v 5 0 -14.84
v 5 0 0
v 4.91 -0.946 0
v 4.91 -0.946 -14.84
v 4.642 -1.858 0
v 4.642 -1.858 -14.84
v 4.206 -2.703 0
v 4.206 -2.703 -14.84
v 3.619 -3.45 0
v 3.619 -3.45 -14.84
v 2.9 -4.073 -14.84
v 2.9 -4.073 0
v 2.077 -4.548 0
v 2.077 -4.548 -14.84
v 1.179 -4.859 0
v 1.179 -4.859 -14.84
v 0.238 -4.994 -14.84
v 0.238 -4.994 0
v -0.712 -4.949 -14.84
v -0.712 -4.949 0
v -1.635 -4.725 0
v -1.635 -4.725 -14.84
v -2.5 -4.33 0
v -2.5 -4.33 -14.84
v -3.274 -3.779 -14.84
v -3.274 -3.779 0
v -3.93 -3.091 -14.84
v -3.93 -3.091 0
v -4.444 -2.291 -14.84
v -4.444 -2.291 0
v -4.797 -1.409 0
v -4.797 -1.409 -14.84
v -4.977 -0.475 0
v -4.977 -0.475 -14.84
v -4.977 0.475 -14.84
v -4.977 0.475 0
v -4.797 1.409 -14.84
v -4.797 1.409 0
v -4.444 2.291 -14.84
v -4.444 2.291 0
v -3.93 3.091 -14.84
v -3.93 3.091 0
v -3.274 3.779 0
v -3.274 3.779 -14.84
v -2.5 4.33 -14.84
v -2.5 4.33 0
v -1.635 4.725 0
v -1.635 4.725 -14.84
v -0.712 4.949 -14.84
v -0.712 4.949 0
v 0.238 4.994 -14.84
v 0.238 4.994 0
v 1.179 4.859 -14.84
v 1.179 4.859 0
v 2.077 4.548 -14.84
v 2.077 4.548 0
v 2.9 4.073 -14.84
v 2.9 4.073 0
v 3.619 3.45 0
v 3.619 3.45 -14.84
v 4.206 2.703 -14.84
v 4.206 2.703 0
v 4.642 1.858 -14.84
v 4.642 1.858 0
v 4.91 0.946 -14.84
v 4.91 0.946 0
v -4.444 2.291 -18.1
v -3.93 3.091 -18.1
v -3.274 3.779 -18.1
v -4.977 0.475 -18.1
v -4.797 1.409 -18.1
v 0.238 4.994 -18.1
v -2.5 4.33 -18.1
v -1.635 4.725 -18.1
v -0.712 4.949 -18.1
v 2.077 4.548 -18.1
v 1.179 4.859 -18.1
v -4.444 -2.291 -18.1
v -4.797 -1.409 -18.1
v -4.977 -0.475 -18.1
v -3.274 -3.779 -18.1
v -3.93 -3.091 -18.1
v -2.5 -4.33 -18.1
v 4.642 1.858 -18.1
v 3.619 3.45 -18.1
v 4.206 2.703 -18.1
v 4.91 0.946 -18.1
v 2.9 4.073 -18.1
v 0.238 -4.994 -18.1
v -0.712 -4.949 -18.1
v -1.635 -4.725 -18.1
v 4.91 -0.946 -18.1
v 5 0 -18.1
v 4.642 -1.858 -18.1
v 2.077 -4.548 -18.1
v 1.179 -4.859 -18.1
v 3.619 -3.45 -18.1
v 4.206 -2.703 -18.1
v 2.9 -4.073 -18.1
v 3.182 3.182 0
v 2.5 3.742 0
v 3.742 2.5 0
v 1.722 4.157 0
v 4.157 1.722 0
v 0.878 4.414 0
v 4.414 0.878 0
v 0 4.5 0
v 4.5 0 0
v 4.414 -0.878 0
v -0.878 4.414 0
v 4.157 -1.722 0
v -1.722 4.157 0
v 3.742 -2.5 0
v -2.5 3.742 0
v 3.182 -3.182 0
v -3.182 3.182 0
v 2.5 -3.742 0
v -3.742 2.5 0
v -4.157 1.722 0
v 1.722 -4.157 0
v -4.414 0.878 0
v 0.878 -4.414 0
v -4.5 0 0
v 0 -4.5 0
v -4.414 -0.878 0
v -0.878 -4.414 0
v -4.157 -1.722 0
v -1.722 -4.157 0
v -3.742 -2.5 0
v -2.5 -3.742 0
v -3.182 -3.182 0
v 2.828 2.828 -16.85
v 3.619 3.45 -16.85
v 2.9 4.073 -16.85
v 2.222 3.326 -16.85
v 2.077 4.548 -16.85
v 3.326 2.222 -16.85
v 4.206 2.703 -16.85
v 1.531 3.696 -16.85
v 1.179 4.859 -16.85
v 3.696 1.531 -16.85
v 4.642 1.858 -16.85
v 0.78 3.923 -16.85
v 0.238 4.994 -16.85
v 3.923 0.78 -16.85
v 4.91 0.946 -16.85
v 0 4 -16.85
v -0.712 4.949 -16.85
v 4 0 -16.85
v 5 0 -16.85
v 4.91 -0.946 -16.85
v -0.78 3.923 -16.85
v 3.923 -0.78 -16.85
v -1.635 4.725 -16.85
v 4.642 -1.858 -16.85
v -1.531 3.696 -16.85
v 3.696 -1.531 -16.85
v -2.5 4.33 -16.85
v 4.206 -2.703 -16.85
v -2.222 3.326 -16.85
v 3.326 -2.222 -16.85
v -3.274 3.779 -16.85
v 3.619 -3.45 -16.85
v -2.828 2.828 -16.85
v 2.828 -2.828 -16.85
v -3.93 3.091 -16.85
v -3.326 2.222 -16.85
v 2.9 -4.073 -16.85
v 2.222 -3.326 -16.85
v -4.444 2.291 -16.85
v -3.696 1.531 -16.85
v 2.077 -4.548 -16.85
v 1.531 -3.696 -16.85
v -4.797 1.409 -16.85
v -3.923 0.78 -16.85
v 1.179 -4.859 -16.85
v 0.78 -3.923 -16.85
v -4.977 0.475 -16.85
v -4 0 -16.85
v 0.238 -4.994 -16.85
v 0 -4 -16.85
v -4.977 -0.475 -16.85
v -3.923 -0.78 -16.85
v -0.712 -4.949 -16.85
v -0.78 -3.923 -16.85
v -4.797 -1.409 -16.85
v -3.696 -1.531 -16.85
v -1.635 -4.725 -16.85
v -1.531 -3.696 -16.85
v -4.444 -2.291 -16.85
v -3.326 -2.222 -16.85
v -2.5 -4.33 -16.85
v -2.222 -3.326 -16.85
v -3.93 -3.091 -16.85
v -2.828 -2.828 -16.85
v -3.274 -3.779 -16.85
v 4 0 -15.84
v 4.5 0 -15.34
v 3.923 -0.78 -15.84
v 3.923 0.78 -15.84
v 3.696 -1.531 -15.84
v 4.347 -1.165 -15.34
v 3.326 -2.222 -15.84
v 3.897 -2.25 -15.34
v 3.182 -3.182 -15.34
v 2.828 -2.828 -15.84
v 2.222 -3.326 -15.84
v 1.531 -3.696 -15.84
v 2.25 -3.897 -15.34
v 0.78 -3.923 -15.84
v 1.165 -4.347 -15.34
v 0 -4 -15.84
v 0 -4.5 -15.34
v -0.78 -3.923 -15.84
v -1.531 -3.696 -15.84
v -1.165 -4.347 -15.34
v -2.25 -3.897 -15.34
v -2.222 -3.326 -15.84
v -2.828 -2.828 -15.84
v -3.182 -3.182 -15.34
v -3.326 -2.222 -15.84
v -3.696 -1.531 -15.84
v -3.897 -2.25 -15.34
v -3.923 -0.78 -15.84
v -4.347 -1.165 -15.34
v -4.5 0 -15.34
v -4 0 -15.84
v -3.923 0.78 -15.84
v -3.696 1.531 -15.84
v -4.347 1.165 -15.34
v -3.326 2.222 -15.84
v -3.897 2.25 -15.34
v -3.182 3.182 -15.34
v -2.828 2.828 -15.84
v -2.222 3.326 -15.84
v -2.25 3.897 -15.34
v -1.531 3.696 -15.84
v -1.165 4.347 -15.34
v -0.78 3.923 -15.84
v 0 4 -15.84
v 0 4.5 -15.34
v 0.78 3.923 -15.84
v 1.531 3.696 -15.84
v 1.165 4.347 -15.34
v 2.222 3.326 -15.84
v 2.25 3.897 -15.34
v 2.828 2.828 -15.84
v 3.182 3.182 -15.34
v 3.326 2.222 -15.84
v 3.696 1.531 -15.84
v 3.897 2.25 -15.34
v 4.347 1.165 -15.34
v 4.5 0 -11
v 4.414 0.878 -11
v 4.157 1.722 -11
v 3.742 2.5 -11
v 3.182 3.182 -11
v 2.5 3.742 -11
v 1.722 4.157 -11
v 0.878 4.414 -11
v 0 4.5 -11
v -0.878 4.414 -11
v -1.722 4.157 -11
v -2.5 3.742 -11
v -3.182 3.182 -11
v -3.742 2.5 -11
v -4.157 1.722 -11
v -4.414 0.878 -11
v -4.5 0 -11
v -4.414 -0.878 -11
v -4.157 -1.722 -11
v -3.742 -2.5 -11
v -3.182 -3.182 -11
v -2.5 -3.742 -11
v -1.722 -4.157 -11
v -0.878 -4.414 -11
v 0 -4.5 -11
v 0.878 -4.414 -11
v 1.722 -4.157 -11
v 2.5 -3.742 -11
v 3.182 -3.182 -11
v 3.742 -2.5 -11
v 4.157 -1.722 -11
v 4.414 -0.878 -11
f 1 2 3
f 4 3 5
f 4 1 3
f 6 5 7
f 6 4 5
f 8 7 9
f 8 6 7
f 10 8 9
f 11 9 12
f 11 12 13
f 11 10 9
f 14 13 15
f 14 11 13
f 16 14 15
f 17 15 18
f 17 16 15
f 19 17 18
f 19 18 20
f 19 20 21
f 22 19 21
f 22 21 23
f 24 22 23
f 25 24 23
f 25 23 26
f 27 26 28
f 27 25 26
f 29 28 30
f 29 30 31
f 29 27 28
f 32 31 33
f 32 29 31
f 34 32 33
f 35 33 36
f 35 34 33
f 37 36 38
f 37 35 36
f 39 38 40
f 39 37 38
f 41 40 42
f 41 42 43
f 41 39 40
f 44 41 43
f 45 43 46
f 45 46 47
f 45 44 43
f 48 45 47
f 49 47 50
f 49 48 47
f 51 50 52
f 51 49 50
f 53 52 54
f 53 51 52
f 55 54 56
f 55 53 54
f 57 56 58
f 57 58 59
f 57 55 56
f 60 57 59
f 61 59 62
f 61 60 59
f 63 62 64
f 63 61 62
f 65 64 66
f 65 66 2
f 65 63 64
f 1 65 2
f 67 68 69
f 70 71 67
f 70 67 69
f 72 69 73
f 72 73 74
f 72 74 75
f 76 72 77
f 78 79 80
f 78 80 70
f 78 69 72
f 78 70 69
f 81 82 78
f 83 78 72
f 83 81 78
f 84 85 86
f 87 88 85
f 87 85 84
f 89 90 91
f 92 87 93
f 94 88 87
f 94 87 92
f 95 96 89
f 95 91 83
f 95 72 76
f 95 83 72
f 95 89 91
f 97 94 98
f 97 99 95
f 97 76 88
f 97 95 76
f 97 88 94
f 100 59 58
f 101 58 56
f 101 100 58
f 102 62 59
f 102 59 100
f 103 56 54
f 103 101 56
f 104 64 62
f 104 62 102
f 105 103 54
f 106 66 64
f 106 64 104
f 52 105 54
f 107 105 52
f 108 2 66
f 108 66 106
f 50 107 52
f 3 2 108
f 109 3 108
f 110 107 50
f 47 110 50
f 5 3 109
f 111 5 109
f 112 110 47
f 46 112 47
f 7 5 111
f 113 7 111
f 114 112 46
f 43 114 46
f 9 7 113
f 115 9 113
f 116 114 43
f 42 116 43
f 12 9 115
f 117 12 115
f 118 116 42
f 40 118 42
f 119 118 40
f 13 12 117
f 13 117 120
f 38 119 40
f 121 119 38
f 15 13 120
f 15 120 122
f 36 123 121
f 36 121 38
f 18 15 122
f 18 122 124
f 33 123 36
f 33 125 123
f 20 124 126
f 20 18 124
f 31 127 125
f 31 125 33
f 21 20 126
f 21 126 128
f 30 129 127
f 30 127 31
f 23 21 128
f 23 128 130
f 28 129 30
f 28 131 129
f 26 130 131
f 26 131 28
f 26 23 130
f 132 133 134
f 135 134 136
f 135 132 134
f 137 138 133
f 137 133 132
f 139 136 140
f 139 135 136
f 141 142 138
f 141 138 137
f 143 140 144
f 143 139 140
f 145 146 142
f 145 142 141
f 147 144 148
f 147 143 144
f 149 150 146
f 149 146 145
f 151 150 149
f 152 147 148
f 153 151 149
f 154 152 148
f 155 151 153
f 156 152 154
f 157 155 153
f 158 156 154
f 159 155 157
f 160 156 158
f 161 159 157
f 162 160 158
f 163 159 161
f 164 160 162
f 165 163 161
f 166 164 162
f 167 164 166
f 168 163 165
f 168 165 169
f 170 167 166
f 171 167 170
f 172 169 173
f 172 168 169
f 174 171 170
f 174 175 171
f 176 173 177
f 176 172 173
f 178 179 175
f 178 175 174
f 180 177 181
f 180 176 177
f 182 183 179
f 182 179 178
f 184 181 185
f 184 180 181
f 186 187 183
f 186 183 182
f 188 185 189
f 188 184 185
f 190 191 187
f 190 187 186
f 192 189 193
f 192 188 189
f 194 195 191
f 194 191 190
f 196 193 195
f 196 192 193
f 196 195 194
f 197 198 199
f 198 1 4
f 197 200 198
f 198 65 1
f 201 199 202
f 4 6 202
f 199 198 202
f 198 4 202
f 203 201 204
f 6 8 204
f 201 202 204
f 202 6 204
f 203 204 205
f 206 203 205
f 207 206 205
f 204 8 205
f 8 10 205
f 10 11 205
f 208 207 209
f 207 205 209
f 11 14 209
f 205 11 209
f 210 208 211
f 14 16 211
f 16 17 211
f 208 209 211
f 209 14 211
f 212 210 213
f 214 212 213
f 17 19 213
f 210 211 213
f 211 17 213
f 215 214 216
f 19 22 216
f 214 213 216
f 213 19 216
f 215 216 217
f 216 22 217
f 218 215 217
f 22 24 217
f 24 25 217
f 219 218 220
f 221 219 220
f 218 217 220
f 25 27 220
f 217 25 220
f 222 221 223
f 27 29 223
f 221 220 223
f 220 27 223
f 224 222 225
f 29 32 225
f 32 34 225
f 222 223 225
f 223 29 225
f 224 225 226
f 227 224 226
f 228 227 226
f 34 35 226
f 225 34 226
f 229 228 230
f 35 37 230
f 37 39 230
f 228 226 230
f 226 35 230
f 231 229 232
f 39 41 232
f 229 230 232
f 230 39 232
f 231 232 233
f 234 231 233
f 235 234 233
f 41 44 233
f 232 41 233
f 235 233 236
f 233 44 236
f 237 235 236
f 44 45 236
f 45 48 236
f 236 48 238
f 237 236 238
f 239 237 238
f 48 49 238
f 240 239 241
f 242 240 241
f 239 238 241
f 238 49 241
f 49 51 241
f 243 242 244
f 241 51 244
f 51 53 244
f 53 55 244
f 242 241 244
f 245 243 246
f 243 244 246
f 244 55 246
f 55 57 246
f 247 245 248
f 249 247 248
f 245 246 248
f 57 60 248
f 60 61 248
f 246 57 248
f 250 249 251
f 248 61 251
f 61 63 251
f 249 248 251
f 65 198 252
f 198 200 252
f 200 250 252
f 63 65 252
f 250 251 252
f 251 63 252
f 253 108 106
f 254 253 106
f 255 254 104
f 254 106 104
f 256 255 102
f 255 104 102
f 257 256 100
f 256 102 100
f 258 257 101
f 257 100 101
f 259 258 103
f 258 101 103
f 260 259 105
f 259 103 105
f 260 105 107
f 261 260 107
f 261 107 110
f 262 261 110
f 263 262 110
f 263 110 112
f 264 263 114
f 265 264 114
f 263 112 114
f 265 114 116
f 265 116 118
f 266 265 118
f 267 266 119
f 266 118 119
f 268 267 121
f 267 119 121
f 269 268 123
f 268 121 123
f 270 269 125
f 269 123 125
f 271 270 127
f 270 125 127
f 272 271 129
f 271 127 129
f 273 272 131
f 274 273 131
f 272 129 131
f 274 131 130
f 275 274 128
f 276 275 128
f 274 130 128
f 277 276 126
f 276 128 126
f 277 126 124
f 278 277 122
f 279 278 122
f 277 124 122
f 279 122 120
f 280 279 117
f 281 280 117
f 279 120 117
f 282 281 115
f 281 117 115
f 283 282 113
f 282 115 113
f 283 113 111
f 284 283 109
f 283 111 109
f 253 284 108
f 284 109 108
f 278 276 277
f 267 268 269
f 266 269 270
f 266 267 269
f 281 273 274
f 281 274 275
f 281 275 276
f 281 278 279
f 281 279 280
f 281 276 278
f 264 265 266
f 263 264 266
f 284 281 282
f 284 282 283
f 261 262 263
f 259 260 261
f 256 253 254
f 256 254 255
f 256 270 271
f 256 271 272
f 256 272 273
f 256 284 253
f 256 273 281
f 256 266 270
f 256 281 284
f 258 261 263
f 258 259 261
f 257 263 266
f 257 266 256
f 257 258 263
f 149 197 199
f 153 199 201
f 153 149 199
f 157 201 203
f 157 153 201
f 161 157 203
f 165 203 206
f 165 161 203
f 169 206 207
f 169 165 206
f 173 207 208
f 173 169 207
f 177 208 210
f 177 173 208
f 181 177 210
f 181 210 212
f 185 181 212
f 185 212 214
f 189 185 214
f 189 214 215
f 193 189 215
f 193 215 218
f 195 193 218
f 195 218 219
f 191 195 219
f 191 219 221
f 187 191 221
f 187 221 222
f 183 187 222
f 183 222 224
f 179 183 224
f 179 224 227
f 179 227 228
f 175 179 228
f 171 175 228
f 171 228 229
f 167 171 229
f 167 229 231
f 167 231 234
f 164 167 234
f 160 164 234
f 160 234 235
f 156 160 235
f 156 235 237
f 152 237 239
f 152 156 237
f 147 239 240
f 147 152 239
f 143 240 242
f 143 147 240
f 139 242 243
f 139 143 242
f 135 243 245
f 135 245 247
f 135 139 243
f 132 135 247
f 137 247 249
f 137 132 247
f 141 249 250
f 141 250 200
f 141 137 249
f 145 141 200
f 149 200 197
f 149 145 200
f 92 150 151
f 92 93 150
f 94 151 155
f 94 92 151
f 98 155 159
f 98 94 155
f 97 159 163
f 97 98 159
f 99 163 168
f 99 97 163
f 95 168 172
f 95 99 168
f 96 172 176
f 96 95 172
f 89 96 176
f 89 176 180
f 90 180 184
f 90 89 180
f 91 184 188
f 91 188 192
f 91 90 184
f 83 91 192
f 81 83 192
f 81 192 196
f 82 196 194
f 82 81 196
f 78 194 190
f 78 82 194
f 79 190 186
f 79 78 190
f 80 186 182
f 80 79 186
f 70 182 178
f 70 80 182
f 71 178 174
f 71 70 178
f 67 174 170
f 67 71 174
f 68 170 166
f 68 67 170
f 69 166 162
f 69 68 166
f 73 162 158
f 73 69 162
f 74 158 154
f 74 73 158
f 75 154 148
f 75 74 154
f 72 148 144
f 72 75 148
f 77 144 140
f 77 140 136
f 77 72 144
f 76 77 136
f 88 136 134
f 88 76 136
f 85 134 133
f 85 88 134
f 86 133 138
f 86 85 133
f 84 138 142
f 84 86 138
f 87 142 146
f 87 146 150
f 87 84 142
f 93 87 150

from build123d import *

# Parameters (mm, degrees)
SKETCH2_R          = 4.5
CUT_EXTRUDE1_DEPTH = 11
CHAMFER2_SIZE      = 2


with BuildPart() as part:
    # Sketch1 → Revolve1 (revolve)
    with BuildSketch(Plane(origin=(0, 0, 0), x_dir=(0, 0, -1), z_dir=(1, 0, 0)), mode=Mode.PRIVATE) as revolve1_sk:
        Polygon((16.85, -5), (18.1, -5), (18.1, 0), (0, 0), (0, -5), (16.84, -5), (16.84, -4), (16.85, -4), align=None)
    revolve(revolve1_sk.sketch.rotate(Axis((0, 0, 0), (0, 0, -1)), 270), axis=Axis((0, 0, 0), (0, 0, -1)))

    # Sketch2 → Cut-Extrude1 (cut)
    with BuildSketch(Plane.XY):
        Circle(SKETCH2_R)
    extrude(amount=-CUT_EXTRUDE1_DEPTH, mode=Mode.SUBTRACT)

    # Chamfer2
    # the kernel refuses this chamfer: 2 mm, written as the material it takes off along each edge
    with BuildSketch(Plane(origin=(0, 0, -16.84), x_dir=(1, 0, 0), z_dir=(0, 1, 0))) as chamfer2_piece_1_section:
        Polygon((5 - CHAMFER2_SIZE, 0), (5, -CHAMFER2_SIZE), (5, 0), align=None)
    chamfer2_piece_1 = revolve(axis=Axis((0, 0, -16.84), (0, 0, -1)), mode=Mode.PRIVATE)
    chamfer2_piece_1 = chamfer2_piece_1 - Plane(origin=(0, 0, -15.337254953), x_dir=(1, 0, 0), z_dir=(0, 0, -1)) * Cylinder(4, 20, mode=Mode.PRIVATE)
    add(chamfer2_piece_1, mode=Mode.SUBTRACT)


solid = part.part
